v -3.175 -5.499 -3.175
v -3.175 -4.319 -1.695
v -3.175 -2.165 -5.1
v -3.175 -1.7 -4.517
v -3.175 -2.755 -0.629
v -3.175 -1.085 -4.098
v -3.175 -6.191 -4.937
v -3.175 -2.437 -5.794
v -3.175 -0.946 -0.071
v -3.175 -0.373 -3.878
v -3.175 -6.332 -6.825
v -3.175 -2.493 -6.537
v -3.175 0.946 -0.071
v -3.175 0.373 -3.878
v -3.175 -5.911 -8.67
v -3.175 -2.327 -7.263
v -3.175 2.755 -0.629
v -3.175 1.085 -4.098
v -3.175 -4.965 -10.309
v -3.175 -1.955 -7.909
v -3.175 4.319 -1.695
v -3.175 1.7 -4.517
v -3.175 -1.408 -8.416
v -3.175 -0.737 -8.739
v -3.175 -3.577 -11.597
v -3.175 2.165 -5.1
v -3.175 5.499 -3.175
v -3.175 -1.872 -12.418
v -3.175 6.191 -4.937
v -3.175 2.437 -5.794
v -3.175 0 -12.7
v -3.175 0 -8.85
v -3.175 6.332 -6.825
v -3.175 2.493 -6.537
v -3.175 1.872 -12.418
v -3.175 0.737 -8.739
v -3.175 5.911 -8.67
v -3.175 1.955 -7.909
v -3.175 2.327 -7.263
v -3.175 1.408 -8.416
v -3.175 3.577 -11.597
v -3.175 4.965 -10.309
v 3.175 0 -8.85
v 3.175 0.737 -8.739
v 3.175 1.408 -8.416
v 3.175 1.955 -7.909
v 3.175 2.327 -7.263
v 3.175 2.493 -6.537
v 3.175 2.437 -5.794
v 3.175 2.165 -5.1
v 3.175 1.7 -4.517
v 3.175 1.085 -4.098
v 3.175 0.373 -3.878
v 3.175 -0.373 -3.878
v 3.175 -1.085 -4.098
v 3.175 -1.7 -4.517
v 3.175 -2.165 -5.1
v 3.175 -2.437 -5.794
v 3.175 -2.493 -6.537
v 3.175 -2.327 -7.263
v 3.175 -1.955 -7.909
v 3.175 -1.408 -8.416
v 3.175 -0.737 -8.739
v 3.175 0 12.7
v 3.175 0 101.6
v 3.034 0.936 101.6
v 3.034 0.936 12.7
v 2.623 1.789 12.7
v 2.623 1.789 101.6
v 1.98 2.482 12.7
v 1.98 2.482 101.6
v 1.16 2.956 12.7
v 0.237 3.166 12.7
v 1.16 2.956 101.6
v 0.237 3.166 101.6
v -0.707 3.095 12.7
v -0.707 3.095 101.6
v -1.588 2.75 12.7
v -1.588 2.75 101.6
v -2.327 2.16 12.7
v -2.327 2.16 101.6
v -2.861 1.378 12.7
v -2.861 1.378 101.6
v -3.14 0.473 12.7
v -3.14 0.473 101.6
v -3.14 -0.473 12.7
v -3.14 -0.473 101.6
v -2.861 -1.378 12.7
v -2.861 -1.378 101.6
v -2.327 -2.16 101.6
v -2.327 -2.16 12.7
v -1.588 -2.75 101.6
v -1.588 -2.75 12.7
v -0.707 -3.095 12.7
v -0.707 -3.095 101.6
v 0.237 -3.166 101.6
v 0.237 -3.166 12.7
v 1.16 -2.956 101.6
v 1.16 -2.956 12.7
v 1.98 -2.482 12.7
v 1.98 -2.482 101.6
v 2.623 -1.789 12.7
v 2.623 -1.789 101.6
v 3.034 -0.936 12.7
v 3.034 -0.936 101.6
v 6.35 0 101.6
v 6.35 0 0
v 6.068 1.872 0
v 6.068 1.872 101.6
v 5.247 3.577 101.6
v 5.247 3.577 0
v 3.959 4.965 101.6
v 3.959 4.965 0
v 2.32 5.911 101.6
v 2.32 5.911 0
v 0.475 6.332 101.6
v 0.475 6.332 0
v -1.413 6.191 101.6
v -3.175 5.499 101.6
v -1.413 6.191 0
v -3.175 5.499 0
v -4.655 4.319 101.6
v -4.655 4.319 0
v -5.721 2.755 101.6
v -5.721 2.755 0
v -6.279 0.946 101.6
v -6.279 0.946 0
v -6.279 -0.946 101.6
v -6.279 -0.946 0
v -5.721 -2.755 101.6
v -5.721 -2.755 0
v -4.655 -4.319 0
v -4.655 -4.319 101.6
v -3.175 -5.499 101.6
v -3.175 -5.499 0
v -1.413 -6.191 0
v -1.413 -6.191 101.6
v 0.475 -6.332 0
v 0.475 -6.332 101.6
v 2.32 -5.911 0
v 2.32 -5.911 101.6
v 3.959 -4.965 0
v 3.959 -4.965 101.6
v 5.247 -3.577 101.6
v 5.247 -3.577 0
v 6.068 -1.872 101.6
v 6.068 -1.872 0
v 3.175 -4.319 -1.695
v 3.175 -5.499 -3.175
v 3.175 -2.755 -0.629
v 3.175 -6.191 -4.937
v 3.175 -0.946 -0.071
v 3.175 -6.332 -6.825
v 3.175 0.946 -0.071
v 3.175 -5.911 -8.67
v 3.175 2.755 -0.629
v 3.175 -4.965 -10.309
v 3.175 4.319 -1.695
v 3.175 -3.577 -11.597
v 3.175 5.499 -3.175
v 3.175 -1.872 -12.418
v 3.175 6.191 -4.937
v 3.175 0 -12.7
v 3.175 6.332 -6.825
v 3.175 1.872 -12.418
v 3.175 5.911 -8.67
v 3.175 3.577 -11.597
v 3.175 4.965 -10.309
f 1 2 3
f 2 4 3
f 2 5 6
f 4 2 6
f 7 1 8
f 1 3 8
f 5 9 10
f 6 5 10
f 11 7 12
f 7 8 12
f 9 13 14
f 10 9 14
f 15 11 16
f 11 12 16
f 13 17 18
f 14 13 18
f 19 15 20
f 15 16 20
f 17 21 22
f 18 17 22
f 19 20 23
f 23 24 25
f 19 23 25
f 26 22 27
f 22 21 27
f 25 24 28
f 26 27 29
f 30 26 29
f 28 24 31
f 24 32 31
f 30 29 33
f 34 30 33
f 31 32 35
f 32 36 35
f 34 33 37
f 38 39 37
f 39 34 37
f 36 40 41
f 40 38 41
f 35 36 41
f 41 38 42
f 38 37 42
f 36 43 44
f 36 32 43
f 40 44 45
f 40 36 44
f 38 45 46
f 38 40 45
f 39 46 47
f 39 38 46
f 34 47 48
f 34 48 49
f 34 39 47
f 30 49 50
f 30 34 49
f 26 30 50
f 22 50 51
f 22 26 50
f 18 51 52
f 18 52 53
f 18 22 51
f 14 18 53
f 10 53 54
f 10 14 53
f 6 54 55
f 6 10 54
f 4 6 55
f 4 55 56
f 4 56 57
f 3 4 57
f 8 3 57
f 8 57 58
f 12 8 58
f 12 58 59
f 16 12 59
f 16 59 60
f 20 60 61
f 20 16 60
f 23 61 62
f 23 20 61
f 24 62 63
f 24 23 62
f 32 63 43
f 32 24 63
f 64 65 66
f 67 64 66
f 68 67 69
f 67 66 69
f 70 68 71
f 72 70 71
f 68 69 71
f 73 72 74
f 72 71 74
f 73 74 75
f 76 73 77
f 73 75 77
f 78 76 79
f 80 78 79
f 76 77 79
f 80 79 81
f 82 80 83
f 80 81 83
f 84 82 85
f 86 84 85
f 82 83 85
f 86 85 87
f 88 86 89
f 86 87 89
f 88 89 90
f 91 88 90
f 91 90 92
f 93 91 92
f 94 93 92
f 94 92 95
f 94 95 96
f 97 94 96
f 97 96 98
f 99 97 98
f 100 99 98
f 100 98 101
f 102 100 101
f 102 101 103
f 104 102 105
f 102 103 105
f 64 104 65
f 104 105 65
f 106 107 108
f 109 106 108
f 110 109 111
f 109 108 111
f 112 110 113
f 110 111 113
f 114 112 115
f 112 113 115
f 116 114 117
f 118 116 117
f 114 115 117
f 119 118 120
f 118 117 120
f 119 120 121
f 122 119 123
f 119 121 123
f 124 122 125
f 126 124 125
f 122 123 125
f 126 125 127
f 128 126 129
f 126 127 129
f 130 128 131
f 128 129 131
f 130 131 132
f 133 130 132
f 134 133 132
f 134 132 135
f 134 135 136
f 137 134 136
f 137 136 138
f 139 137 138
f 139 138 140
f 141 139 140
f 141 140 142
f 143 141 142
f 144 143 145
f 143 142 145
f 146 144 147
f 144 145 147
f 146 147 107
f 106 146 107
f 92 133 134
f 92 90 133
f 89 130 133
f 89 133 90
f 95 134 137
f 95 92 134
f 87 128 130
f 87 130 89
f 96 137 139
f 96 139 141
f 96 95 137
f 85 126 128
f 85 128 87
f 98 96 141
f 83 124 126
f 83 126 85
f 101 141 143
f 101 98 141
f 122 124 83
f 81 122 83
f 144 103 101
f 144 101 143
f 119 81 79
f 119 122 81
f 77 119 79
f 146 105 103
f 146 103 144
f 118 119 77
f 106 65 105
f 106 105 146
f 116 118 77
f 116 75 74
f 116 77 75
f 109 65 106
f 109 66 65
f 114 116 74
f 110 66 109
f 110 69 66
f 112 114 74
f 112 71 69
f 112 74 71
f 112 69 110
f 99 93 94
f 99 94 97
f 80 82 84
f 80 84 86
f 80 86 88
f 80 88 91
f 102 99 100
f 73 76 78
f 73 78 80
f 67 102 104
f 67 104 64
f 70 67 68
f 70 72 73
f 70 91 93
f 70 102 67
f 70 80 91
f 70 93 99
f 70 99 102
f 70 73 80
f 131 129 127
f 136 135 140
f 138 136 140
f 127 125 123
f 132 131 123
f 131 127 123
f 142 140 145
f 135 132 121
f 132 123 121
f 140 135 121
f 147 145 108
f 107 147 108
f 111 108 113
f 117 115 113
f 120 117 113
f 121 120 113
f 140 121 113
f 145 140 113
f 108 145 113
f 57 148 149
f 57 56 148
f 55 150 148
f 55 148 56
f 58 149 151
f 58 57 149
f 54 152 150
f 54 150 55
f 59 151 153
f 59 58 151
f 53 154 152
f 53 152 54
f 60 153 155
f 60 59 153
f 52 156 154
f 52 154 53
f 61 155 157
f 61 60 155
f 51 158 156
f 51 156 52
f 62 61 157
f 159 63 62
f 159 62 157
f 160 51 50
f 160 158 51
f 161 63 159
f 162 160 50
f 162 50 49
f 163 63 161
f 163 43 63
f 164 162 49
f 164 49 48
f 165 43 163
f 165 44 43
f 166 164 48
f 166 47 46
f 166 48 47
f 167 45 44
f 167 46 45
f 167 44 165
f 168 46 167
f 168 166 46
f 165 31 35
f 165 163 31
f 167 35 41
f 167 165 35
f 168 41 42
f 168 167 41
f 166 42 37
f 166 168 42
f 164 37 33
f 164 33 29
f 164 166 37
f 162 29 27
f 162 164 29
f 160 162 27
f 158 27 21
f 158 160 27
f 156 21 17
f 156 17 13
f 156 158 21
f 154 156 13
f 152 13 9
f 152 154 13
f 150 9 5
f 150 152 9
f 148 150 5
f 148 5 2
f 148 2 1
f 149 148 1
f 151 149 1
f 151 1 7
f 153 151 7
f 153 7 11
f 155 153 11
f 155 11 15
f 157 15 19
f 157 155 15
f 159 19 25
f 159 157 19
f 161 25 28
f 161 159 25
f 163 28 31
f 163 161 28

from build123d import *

# Parameters (mm, degrees)
SKETCH1_R           = 6.35
BOSS_EXTRUDE1_DEPTH = 101.6
SKETCH2_R           = 3.175
CUT_EXTRUDE1_DEPTH  = 88.9
SKETCH3_R           = 6.35
SKETCH3_R_2         = 2.5
BOSS_EXTRUDE2_DEPTH = 3.175


with BuildPart() as part:
    # Sketch1 → Boss-Extrude1 (new body)
    with BuildSketch(Plane.XY):
        Circle(SKETCH1_R)
    extrude(amount=BOSS_EXTRUDE1_DEPTH)

    # Sketch2 → Cut-Extrude1 (cut)
    with BuildSketch(Plane.XY.offset(101.6)):
        Circle(SKETCH2_R)
    extrude(amount=-CUT_EXTRUDE1_DEPTH, mode=Mode.SUBTRACT)


with BuildPart() as body_2:
    # Sketch3 → Boss-Extrude2 (new, symmetric)
    with BuildSketch(Plane(origin=(0, 0, 0), x_dir=(0, 0, -1), z_dir=(1, 0, 0))):
        with Locations((6.35, 0)):
            Circle(SKETCH3_R)
        with Locations((6.35, 0)):
            Circle(SKETCH3_R_2, mode=Mode.SUBTRACT)
    extrude(amount=BOSS_EXTRUDE2_DEPTH, both=True)


solid = Compound([part.part, body_2.part])
